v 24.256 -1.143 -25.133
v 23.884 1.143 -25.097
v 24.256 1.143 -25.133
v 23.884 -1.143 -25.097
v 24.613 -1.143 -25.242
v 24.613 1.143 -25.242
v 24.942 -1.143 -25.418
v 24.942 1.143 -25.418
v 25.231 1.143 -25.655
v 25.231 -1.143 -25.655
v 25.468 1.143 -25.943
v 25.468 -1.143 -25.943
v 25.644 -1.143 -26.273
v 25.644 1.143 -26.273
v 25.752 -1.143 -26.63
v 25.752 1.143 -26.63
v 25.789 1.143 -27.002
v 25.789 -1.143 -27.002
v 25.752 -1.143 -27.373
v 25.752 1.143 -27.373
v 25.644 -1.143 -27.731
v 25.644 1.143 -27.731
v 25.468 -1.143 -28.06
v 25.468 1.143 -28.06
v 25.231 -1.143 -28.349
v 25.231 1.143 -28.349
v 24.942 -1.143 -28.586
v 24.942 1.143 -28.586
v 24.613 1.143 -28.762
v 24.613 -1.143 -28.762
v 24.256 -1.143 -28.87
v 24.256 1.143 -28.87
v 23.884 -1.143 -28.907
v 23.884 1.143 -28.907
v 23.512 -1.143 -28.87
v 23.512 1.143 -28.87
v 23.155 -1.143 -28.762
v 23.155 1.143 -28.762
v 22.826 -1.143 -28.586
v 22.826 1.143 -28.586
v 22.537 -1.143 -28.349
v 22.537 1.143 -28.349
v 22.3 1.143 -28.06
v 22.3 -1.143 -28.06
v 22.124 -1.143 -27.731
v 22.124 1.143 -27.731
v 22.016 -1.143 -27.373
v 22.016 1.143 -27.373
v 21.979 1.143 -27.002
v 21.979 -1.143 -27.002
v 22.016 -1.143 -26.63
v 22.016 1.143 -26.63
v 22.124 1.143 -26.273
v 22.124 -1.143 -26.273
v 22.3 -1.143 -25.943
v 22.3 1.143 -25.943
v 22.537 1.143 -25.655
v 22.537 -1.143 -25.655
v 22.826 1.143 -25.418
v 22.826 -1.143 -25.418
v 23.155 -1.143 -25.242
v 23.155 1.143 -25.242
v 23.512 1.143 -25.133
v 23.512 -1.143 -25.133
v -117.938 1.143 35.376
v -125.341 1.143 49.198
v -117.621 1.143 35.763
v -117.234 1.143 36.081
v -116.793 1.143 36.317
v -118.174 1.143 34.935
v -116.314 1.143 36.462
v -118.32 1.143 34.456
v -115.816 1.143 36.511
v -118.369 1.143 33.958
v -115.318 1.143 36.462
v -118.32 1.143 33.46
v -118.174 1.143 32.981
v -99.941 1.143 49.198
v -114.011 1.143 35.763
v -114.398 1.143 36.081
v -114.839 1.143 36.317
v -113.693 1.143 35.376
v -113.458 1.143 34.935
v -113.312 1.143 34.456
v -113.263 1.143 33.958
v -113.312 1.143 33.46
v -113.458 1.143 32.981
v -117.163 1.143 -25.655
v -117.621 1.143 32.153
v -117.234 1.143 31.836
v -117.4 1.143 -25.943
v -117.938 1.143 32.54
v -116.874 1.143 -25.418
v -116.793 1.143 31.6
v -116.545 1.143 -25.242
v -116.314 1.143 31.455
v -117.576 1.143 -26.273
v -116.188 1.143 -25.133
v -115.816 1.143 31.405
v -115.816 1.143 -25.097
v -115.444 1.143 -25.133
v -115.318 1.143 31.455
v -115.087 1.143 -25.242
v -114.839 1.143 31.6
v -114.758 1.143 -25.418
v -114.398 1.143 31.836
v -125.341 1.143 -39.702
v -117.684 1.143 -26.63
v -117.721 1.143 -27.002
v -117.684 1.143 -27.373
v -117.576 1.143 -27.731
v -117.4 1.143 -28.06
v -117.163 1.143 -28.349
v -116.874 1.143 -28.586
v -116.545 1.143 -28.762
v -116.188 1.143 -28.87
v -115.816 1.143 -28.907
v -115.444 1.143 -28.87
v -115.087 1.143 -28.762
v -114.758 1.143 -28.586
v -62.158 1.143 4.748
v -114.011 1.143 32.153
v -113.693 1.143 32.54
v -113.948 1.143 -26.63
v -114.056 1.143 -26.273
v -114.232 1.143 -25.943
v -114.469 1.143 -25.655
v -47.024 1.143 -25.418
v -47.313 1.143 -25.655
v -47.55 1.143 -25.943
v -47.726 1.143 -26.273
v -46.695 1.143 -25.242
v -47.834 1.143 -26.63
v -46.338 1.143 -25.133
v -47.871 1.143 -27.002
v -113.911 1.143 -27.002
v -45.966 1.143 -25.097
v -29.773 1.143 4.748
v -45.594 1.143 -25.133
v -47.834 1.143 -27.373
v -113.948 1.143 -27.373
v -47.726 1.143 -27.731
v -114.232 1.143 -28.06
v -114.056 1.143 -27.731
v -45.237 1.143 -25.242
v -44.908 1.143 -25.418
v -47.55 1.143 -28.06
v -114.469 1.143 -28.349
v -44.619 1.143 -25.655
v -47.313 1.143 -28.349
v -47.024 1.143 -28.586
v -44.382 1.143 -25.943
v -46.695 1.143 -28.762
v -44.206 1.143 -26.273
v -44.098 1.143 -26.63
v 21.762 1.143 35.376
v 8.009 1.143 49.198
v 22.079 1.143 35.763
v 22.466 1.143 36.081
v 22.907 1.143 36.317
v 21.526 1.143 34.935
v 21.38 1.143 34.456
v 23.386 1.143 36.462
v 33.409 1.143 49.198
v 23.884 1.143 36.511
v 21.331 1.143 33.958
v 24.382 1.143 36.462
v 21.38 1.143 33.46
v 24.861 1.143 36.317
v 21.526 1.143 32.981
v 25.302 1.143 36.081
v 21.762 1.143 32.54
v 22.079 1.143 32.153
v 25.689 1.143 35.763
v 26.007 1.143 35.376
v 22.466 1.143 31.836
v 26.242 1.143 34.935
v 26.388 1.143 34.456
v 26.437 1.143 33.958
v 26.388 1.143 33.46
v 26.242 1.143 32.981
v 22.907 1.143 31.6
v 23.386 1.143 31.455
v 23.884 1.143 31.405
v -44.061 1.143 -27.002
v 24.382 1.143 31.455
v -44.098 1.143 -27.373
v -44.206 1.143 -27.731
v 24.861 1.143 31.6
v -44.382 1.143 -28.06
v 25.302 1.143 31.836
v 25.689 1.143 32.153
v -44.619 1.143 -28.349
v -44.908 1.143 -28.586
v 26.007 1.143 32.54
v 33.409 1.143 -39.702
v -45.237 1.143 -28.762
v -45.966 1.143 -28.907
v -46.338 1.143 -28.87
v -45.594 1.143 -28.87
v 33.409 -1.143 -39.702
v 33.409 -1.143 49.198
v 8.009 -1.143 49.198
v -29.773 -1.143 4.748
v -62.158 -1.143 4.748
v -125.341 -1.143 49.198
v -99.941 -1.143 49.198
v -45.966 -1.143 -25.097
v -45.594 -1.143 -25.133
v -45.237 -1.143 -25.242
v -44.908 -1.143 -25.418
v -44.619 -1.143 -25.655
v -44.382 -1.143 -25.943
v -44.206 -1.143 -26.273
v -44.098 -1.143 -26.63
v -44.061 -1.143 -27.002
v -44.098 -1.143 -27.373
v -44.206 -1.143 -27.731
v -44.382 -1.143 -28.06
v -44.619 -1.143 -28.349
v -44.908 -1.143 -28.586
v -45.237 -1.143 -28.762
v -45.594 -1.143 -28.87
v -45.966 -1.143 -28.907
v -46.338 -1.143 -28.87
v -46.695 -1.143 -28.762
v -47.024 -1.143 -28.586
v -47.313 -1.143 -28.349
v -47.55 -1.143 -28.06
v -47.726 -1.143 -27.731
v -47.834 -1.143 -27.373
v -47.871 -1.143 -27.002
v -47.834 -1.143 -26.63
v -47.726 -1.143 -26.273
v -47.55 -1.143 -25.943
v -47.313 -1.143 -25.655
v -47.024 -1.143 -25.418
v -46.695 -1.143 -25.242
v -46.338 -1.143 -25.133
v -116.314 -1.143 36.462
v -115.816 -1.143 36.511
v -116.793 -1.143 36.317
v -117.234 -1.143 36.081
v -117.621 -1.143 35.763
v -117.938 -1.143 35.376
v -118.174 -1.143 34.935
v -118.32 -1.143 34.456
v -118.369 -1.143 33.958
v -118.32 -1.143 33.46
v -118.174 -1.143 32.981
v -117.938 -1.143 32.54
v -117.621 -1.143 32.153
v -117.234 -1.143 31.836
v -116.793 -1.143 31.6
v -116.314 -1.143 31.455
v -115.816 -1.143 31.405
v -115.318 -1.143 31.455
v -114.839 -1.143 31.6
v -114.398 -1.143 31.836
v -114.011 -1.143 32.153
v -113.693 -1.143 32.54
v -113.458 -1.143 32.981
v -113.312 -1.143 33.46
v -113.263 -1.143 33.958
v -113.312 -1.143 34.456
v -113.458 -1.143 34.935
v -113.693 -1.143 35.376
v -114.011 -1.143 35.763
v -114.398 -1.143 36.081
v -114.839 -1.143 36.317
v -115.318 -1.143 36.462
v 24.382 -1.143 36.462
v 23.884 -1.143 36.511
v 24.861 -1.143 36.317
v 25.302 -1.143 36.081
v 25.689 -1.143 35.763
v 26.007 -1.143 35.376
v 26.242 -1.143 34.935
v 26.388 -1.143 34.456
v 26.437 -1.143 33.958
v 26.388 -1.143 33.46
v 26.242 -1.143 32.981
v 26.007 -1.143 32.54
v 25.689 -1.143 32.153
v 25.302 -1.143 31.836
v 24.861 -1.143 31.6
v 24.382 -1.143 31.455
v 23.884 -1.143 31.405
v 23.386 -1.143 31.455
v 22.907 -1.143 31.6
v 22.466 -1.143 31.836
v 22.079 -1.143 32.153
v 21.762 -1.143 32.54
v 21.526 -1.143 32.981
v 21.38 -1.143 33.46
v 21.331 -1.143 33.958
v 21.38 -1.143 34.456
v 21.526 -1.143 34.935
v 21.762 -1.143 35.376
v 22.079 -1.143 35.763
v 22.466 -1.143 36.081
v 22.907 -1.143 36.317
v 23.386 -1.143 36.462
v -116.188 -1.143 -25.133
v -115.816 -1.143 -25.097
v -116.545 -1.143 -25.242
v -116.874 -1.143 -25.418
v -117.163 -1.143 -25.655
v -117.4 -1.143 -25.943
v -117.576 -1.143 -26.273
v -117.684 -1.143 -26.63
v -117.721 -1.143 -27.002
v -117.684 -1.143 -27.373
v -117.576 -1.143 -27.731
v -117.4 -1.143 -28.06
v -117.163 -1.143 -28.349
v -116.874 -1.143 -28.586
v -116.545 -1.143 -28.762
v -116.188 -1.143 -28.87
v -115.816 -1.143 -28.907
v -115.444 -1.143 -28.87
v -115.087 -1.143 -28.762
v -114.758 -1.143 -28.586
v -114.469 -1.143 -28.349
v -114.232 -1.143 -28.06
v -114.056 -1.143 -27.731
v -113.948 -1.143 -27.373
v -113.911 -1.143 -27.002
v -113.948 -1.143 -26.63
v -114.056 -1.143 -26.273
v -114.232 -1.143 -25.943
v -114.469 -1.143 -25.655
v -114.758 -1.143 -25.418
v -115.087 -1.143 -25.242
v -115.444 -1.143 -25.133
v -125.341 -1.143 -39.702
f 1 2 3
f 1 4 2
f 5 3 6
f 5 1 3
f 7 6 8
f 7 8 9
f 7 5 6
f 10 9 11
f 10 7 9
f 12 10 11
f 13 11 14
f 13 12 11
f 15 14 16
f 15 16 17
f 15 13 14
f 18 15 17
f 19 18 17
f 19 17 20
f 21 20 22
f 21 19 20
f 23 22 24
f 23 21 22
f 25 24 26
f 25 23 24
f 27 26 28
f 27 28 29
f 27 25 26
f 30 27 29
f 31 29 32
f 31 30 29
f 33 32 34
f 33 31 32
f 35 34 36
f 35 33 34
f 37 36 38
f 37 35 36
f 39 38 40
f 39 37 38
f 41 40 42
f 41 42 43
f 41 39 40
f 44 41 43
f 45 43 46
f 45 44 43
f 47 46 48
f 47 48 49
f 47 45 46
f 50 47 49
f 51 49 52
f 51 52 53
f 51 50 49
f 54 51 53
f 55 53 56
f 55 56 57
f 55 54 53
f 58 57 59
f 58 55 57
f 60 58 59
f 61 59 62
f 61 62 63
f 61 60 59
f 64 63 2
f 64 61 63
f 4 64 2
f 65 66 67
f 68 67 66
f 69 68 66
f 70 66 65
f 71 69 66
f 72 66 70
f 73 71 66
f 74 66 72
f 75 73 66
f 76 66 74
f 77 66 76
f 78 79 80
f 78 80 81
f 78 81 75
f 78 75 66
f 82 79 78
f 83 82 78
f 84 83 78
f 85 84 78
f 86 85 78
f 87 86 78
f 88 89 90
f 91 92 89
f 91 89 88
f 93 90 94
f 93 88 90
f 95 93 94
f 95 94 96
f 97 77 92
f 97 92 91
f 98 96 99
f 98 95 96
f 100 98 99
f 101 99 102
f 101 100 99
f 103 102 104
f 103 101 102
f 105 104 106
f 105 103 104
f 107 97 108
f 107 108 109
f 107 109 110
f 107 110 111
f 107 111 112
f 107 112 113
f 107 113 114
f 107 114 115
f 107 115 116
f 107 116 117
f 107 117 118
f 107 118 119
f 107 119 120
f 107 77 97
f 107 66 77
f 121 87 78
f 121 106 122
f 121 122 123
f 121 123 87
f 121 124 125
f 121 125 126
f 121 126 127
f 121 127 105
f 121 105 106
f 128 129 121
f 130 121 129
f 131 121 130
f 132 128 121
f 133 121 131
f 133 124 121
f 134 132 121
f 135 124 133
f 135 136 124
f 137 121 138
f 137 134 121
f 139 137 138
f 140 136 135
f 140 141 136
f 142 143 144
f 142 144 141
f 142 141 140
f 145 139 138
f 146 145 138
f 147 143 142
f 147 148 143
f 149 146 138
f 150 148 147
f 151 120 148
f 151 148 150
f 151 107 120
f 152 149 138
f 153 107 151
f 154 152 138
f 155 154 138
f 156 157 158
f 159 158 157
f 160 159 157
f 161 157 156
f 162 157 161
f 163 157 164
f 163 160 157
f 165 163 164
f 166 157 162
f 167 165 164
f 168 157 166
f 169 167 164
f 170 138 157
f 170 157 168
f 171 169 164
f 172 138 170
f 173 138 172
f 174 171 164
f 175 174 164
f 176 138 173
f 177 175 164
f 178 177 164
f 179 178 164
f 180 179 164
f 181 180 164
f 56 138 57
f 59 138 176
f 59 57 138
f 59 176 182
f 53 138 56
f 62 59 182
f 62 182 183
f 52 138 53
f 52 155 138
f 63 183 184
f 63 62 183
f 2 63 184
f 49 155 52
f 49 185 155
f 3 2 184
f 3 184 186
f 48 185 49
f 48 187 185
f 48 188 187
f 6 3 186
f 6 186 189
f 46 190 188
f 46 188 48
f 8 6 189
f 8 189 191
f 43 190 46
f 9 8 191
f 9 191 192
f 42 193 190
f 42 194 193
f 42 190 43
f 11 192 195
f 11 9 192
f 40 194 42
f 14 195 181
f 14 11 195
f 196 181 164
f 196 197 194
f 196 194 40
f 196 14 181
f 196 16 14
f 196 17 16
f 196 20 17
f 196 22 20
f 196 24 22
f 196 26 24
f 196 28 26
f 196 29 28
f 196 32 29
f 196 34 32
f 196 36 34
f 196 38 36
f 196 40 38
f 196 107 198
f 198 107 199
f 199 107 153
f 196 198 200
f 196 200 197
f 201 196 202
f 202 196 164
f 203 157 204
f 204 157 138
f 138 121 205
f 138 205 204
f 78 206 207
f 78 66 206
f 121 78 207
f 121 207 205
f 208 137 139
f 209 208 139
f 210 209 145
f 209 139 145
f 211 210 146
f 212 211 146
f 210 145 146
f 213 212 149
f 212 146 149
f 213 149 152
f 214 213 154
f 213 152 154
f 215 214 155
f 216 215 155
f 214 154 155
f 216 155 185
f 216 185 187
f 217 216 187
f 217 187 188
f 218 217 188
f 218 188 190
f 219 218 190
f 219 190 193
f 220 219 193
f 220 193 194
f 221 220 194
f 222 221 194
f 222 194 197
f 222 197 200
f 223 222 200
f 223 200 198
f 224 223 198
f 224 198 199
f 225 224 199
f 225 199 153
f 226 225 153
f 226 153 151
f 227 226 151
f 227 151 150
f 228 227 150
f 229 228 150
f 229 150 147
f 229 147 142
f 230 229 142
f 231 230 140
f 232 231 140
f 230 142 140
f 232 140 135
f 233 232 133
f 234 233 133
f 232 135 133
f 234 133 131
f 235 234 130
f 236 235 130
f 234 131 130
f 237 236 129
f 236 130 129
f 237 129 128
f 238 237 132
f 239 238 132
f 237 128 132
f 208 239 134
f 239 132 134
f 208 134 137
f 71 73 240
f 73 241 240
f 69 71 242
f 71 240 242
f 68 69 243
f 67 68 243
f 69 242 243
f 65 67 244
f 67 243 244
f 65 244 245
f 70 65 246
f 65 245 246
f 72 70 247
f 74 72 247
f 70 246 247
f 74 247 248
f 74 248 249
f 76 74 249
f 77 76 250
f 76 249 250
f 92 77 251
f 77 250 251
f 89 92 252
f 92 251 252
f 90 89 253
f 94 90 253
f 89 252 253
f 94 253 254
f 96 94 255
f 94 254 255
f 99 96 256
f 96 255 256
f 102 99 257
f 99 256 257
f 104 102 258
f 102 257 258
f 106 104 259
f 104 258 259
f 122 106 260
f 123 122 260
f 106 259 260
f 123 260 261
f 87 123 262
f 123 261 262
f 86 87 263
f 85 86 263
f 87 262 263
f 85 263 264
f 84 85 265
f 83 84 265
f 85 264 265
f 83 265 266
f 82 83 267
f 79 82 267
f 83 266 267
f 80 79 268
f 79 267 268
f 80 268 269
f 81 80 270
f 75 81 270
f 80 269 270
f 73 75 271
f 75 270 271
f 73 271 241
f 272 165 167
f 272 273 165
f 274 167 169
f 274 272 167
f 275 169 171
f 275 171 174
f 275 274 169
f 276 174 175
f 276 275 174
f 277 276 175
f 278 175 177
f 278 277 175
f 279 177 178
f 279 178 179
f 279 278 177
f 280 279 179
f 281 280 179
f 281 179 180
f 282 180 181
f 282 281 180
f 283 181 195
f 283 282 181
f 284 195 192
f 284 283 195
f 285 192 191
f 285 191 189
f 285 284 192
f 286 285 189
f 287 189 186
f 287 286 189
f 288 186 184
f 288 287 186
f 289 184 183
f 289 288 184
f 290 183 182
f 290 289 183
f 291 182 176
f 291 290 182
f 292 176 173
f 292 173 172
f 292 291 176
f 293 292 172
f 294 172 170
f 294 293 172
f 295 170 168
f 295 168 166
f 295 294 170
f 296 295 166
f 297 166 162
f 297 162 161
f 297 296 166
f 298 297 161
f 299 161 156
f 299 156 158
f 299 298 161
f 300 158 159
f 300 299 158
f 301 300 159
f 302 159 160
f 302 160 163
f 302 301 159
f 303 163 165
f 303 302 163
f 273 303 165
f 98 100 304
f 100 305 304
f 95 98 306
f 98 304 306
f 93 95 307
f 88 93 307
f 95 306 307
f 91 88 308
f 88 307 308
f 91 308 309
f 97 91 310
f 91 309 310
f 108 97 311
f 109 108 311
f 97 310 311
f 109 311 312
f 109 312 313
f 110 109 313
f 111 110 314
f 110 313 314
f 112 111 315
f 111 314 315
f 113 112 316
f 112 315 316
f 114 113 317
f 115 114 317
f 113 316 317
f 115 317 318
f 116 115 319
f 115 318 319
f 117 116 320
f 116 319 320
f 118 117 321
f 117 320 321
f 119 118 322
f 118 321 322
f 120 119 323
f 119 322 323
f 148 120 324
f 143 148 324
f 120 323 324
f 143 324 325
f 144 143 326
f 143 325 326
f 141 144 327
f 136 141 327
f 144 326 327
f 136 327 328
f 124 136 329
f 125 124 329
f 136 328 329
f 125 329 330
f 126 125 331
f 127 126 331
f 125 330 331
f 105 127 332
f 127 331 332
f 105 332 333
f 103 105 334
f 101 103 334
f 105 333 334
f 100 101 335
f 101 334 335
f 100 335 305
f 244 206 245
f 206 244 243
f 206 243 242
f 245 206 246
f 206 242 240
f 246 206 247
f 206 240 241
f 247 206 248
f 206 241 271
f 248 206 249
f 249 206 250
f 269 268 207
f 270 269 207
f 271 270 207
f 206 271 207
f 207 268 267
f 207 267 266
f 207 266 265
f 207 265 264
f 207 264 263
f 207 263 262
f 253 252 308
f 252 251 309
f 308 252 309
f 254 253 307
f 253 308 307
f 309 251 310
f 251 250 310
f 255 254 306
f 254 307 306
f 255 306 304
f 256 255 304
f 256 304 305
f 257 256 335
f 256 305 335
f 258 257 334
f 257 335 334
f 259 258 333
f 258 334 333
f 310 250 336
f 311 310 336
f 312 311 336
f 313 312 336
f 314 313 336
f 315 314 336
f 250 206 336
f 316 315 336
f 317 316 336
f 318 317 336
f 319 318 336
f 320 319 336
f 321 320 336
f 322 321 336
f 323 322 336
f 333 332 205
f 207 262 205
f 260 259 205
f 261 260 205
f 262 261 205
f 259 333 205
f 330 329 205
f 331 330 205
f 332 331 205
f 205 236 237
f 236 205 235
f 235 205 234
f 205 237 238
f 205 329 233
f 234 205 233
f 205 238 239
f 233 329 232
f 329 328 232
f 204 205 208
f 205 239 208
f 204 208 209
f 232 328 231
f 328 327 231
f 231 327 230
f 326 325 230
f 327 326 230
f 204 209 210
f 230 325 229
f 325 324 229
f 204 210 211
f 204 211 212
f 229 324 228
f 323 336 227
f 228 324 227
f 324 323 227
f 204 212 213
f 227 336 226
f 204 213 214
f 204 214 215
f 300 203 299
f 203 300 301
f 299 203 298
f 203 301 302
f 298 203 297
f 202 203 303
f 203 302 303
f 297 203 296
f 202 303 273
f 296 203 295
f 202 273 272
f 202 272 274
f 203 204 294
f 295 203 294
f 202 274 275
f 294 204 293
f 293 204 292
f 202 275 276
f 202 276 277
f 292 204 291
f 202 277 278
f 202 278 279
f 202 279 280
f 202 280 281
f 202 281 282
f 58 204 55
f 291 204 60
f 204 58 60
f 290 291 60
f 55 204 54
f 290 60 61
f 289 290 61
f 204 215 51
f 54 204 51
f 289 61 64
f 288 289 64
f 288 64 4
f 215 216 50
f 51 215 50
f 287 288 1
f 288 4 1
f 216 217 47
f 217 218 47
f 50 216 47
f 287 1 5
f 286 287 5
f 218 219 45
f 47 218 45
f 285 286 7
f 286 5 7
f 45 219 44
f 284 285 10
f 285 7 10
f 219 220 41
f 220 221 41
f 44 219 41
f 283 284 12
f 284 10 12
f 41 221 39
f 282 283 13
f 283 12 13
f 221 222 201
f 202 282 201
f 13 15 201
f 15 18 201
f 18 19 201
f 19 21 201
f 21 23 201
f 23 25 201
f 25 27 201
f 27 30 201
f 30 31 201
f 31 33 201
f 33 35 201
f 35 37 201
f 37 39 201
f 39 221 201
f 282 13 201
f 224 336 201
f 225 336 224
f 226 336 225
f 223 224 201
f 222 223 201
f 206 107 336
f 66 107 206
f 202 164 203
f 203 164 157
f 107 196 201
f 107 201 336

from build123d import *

# Parameters (mm, degrees)
SKETCH1_R           = 2.5527
SKETCH1_R_2         = 1.905
BOSS_EXTRUDE1_DEPTH = 1.143
SKETCH3_R           = 1.905
CUT_EXTRUDE1_DEPTH  = 135.670161968
SKETCH4_W           = 50.8
SKETCH4_H           = 19.05
BOSS_EXTRUDE2_DEPTH = 2.286


with BuildPart() as part:
    # Sketch1 → Boss-Extrude1 (new, symmetric)
    with BuildSketch(Plane(origin=(0, 0, 0), x_dir=(1, 0, 0), z_dir=(0, 1, 0))):
        Polygon((-45.965990991, 39.701801802), (33.409009009, 39.701801802), (33.409009009, -49.198198198), (8.009009009, -49.198198198), (-45.965990991, 14.301801802), align=None)
        with Locations(Location((23.884009009, -33.958198198, 0), (0, 0, 270))):
            Circle(SKETCH1_R, mode=Mode.SUBTRACT)
        with Locations(Location((23.884009009, 27.001801802, 0), (0, 0, 270))):
            Circle(SKETCH1_R_2, mode=Mode.SUBTRACT)
    boss_extrude1 = extrude(amount=BOSS_EXTRUDE1_DEPTH, both=True)

    # Mirror1: Boss-Extrude1 across plane
    add(boss_extrude1.mirror(Plane(origin=(-45.965990991, 1.143, 0), x_dir=(0, 0, 1), z_dir=(-1, 0, 0))))

    # Sketch3 → Cut-Extrude1 (cut, through all)
    with BuildSketch(Plane(origin=(0, 1.143, 0), x_dir=(1, 0, 0), z_dir=(0, 1, 0))):
        with Locations(Location((-45.965990991, 27.001801802, 0), (0, 0, 270))):
            Circle(SKETCH3_R)
    extrude(amount=-CUT_EXTRUDE1_DEPTH, mode=Mode.SUBTRACT)

    # Sketch4 → Boss-Extrude2 (add)
    with BuildSketch(Plane(origin=(0, 1.143, 0), x_dir=(1, 0, 0), z_dir=(0, 1, 0))):
        with Locations((-45.965990991, 4.776801802)):
            Rectangle(SKETCH4_W, SKETCH4_H)
    extrude(amount=-BOSS_EXTRUDE2_DEPTH)


solid = part.part
